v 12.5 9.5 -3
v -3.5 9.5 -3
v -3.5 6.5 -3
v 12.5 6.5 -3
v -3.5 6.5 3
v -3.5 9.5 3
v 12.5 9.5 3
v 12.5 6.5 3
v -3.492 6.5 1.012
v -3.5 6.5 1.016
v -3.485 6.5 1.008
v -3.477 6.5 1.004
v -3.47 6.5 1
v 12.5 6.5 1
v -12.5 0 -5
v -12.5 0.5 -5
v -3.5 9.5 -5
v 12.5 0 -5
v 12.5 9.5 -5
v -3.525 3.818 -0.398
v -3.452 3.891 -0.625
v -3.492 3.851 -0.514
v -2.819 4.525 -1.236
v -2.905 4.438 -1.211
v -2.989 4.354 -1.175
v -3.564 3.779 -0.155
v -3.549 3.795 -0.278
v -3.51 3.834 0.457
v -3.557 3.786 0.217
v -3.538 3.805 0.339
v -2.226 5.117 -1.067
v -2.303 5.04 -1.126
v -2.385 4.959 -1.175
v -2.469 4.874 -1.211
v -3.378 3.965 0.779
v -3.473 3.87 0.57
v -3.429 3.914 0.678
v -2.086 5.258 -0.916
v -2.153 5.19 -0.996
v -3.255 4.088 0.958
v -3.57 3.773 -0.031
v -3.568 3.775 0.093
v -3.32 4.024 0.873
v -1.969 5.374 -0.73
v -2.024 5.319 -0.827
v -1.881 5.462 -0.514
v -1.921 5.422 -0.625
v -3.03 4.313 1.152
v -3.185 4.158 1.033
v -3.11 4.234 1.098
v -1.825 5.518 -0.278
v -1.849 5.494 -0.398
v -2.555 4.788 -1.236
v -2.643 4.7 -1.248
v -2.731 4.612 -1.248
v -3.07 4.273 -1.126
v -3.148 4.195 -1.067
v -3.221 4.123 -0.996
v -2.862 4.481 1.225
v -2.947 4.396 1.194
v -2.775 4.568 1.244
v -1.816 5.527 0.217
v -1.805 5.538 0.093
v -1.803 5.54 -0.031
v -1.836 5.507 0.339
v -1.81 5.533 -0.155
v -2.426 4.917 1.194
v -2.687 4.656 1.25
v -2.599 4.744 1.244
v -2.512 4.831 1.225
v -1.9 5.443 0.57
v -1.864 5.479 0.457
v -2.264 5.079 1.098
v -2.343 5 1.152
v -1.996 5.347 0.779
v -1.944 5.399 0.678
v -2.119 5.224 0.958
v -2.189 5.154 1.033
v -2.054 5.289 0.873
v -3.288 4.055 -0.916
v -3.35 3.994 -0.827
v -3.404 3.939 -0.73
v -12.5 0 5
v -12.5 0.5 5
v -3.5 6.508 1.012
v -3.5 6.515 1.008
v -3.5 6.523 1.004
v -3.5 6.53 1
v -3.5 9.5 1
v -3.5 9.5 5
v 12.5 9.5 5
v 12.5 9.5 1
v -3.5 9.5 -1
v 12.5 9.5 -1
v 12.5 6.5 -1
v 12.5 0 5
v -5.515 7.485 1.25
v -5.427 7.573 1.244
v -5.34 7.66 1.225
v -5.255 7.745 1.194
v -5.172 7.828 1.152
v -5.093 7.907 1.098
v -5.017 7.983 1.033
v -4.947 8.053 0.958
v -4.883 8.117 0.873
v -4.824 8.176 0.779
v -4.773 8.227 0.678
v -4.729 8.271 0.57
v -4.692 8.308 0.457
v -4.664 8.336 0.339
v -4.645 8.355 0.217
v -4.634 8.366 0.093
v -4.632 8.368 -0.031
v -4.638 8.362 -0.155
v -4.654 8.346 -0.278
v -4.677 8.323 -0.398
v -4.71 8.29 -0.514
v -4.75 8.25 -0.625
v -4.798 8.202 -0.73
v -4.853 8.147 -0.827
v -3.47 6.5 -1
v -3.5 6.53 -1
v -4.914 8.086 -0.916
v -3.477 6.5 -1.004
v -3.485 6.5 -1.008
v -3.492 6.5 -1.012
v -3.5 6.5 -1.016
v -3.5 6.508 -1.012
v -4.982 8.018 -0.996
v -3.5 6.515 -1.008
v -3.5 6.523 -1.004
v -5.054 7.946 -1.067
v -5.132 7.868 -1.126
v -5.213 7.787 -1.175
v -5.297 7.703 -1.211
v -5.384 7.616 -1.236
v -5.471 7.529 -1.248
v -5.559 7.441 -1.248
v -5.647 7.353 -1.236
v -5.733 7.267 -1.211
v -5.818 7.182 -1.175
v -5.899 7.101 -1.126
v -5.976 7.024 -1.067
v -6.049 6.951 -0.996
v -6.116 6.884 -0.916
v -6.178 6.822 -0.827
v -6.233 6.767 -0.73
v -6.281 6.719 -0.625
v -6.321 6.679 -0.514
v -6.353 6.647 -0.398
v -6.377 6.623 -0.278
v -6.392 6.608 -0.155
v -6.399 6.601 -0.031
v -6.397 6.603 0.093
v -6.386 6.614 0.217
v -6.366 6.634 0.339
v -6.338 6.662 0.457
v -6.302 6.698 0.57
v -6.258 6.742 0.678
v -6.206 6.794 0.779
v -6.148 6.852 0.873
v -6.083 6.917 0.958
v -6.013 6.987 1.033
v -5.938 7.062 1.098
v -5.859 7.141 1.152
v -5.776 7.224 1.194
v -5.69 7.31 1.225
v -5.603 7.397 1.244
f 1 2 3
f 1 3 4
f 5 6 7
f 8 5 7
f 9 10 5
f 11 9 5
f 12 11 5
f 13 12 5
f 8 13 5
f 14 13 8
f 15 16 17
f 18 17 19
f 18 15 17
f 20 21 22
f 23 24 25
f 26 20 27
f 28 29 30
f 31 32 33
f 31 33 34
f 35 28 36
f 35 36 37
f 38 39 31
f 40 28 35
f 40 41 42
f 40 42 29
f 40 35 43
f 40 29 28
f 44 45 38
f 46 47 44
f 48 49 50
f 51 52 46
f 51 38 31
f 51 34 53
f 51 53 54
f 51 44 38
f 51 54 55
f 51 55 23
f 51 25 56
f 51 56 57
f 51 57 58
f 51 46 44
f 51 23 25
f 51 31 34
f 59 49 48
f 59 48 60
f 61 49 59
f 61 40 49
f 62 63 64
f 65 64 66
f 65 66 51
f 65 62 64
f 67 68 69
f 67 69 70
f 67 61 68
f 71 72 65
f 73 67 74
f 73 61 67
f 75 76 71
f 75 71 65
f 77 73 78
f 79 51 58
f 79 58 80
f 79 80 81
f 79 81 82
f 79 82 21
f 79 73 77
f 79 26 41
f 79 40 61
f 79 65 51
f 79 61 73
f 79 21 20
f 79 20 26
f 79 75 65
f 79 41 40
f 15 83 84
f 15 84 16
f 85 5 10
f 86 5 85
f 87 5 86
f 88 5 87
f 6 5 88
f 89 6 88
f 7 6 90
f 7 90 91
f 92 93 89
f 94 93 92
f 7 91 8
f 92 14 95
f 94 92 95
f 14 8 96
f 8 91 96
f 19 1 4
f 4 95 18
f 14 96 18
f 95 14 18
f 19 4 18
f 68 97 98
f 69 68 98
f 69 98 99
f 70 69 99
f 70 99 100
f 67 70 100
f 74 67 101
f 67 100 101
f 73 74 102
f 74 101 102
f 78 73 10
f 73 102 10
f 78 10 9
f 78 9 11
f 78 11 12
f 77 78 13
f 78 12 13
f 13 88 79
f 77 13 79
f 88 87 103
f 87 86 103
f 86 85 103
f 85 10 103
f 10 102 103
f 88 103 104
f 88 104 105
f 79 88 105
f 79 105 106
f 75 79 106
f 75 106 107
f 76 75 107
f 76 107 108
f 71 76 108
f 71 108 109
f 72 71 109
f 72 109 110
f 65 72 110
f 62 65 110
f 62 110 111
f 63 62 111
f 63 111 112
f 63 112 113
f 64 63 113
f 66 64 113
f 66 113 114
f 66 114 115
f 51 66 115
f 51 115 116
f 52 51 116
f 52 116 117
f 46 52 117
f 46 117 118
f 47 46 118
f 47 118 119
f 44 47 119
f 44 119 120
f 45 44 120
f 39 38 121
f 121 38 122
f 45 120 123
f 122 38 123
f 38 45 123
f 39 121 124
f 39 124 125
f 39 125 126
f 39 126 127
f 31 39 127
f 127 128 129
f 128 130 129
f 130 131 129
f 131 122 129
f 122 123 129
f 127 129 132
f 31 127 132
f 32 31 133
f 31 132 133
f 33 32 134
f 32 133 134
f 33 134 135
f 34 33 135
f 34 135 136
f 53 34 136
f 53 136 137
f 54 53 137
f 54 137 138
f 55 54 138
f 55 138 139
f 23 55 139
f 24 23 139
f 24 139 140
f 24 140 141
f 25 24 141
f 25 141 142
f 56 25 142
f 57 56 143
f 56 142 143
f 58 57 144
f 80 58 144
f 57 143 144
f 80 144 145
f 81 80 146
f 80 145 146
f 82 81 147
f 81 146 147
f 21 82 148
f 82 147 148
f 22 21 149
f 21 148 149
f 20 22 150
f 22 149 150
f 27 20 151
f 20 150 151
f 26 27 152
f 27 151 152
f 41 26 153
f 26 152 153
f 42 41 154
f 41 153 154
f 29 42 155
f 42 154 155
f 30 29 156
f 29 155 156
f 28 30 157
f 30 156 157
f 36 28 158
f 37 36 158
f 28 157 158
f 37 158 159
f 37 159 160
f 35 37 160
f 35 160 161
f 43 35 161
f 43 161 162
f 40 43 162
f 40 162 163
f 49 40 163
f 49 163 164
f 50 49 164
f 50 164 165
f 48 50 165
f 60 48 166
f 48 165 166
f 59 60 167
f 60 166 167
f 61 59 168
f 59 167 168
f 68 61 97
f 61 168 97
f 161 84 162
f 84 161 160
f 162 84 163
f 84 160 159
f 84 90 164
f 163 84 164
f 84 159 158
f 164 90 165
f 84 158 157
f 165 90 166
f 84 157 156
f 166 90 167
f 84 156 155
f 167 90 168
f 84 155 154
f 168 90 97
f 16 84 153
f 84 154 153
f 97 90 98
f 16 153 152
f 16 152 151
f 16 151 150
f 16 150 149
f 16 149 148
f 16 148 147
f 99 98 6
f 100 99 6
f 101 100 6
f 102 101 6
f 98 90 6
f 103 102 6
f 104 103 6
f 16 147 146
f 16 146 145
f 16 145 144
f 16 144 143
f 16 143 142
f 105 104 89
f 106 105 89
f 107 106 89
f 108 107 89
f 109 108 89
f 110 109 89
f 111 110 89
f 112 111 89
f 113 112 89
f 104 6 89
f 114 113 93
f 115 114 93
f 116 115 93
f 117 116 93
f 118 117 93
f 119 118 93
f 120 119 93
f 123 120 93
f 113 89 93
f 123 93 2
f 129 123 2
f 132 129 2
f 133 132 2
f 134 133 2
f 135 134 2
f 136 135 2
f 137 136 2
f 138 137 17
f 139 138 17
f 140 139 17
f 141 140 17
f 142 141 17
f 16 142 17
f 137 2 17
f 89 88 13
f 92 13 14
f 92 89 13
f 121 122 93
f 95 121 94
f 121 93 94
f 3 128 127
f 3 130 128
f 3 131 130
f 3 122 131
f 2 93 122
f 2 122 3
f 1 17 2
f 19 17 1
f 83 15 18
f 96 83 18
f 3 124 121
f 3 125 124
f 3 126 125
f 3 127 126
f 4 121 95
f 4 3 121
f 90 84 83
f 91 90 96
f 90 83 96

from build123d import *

# Parameters (mm, degrees)
SKETCH1_W           = 25
SKETCH1_H           = 10
BOSS_EXTRUDE1_DEPTH = 9.5
CHAMFER1_SIZE       = 9
SKETCH3_W           = 16
SKETCH3_H           = 2
CUT_EXTRUDE2_DEPTH  = 3
SKETCH4_R           = 1.25
CUT_EXTRUDE3_DEPTH  = 4


with BuildPart() as part:
    # Sketch1 → Boss-Extrude1 (new body)
    with BuildSketch(Plane(origin=(0, 0, 0), x_dir=(1, 0, 0), z_dir=(0, 1, 0))):
        Rectangle(SKETCH1_W, SKETCH1_H)
    extrude(amount=BOSS_EXTRUDE1_DEPTH)

    # Chamfer1
    chamfer1_edges = [part.edges().sort_by_distance(p)[0] for p in [
        (-12.5, 9.5, 0),
    ]]
    chamfer(chamfer1_edges, length=CHAMFER1_SIZE)

    # Sketch3 → Cut-Extrude2 (cut)
    with BuildSketch(Plane(origin=(0, 9.5, 0), x_dir=(1, 0, 0), z_dir=(0, 1, 0))):
        with Locations((4.5, 2)):
            Rectangle(SKETCH3_W, SKETCH3_H)
        with Locations((4.5, -2)):
            Rectangle(SKETCH3_W, SKETCH3_H)
    extrude(amount=-CUT_EXTRUDE2_DEPTH, mode=Mode.SUBTRACT)

    # Sketch4 → Cut-Extrude3 (cut)
    with BuildSketch(Plane(origin=(-6.5, 6.5, 0), x_dir=(0, 0, 1), z_dir=(-0.707106781, 0.707106781, 0))):
        with Locations((0, 1.392640687)):
            Circle(SKETCH4_R)
    extrude(amount=-CUT_EXTRUDE3_DEPTH, mode=Mode.SUBTRACT)


solid = part.part
